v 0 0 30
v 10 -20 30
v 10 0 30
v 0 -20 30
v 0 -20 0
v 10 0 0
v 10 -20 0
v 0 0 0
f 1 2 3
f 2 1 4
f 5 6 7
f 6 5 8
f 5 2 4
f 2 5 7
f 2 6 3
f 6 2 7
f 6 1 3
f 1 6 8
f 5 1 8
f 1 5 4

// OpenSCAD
// Auther: Tobias Grundtvig
// Date: Oct 1, 2020
//
// A wrapper of the build-in cube module, to get consistent naming

Box([10,20,30], t_x="pos", t_y="neg", t_z="pos");

module Box(dimensions, t_x="center", t_y="center", t_z="center")
{
    tx = t_x == "neg" ? -dimensions[0]/2 : 
            t_x == "pos" ? dimensions[0]/2 : 0;
    ty = t_y == "neg" ? -dimensions[1]/2 : 
            t_y == "pos" ? dimensions[1]/2 : 0;
    tz = t_z == "neg" ? -dimensions[2]/2 : 
            t_z == "pos" ? dimensions[2]/2 : 0;
    translate([tx, ty, tz])
        cube(dimensions, center=true);
}
